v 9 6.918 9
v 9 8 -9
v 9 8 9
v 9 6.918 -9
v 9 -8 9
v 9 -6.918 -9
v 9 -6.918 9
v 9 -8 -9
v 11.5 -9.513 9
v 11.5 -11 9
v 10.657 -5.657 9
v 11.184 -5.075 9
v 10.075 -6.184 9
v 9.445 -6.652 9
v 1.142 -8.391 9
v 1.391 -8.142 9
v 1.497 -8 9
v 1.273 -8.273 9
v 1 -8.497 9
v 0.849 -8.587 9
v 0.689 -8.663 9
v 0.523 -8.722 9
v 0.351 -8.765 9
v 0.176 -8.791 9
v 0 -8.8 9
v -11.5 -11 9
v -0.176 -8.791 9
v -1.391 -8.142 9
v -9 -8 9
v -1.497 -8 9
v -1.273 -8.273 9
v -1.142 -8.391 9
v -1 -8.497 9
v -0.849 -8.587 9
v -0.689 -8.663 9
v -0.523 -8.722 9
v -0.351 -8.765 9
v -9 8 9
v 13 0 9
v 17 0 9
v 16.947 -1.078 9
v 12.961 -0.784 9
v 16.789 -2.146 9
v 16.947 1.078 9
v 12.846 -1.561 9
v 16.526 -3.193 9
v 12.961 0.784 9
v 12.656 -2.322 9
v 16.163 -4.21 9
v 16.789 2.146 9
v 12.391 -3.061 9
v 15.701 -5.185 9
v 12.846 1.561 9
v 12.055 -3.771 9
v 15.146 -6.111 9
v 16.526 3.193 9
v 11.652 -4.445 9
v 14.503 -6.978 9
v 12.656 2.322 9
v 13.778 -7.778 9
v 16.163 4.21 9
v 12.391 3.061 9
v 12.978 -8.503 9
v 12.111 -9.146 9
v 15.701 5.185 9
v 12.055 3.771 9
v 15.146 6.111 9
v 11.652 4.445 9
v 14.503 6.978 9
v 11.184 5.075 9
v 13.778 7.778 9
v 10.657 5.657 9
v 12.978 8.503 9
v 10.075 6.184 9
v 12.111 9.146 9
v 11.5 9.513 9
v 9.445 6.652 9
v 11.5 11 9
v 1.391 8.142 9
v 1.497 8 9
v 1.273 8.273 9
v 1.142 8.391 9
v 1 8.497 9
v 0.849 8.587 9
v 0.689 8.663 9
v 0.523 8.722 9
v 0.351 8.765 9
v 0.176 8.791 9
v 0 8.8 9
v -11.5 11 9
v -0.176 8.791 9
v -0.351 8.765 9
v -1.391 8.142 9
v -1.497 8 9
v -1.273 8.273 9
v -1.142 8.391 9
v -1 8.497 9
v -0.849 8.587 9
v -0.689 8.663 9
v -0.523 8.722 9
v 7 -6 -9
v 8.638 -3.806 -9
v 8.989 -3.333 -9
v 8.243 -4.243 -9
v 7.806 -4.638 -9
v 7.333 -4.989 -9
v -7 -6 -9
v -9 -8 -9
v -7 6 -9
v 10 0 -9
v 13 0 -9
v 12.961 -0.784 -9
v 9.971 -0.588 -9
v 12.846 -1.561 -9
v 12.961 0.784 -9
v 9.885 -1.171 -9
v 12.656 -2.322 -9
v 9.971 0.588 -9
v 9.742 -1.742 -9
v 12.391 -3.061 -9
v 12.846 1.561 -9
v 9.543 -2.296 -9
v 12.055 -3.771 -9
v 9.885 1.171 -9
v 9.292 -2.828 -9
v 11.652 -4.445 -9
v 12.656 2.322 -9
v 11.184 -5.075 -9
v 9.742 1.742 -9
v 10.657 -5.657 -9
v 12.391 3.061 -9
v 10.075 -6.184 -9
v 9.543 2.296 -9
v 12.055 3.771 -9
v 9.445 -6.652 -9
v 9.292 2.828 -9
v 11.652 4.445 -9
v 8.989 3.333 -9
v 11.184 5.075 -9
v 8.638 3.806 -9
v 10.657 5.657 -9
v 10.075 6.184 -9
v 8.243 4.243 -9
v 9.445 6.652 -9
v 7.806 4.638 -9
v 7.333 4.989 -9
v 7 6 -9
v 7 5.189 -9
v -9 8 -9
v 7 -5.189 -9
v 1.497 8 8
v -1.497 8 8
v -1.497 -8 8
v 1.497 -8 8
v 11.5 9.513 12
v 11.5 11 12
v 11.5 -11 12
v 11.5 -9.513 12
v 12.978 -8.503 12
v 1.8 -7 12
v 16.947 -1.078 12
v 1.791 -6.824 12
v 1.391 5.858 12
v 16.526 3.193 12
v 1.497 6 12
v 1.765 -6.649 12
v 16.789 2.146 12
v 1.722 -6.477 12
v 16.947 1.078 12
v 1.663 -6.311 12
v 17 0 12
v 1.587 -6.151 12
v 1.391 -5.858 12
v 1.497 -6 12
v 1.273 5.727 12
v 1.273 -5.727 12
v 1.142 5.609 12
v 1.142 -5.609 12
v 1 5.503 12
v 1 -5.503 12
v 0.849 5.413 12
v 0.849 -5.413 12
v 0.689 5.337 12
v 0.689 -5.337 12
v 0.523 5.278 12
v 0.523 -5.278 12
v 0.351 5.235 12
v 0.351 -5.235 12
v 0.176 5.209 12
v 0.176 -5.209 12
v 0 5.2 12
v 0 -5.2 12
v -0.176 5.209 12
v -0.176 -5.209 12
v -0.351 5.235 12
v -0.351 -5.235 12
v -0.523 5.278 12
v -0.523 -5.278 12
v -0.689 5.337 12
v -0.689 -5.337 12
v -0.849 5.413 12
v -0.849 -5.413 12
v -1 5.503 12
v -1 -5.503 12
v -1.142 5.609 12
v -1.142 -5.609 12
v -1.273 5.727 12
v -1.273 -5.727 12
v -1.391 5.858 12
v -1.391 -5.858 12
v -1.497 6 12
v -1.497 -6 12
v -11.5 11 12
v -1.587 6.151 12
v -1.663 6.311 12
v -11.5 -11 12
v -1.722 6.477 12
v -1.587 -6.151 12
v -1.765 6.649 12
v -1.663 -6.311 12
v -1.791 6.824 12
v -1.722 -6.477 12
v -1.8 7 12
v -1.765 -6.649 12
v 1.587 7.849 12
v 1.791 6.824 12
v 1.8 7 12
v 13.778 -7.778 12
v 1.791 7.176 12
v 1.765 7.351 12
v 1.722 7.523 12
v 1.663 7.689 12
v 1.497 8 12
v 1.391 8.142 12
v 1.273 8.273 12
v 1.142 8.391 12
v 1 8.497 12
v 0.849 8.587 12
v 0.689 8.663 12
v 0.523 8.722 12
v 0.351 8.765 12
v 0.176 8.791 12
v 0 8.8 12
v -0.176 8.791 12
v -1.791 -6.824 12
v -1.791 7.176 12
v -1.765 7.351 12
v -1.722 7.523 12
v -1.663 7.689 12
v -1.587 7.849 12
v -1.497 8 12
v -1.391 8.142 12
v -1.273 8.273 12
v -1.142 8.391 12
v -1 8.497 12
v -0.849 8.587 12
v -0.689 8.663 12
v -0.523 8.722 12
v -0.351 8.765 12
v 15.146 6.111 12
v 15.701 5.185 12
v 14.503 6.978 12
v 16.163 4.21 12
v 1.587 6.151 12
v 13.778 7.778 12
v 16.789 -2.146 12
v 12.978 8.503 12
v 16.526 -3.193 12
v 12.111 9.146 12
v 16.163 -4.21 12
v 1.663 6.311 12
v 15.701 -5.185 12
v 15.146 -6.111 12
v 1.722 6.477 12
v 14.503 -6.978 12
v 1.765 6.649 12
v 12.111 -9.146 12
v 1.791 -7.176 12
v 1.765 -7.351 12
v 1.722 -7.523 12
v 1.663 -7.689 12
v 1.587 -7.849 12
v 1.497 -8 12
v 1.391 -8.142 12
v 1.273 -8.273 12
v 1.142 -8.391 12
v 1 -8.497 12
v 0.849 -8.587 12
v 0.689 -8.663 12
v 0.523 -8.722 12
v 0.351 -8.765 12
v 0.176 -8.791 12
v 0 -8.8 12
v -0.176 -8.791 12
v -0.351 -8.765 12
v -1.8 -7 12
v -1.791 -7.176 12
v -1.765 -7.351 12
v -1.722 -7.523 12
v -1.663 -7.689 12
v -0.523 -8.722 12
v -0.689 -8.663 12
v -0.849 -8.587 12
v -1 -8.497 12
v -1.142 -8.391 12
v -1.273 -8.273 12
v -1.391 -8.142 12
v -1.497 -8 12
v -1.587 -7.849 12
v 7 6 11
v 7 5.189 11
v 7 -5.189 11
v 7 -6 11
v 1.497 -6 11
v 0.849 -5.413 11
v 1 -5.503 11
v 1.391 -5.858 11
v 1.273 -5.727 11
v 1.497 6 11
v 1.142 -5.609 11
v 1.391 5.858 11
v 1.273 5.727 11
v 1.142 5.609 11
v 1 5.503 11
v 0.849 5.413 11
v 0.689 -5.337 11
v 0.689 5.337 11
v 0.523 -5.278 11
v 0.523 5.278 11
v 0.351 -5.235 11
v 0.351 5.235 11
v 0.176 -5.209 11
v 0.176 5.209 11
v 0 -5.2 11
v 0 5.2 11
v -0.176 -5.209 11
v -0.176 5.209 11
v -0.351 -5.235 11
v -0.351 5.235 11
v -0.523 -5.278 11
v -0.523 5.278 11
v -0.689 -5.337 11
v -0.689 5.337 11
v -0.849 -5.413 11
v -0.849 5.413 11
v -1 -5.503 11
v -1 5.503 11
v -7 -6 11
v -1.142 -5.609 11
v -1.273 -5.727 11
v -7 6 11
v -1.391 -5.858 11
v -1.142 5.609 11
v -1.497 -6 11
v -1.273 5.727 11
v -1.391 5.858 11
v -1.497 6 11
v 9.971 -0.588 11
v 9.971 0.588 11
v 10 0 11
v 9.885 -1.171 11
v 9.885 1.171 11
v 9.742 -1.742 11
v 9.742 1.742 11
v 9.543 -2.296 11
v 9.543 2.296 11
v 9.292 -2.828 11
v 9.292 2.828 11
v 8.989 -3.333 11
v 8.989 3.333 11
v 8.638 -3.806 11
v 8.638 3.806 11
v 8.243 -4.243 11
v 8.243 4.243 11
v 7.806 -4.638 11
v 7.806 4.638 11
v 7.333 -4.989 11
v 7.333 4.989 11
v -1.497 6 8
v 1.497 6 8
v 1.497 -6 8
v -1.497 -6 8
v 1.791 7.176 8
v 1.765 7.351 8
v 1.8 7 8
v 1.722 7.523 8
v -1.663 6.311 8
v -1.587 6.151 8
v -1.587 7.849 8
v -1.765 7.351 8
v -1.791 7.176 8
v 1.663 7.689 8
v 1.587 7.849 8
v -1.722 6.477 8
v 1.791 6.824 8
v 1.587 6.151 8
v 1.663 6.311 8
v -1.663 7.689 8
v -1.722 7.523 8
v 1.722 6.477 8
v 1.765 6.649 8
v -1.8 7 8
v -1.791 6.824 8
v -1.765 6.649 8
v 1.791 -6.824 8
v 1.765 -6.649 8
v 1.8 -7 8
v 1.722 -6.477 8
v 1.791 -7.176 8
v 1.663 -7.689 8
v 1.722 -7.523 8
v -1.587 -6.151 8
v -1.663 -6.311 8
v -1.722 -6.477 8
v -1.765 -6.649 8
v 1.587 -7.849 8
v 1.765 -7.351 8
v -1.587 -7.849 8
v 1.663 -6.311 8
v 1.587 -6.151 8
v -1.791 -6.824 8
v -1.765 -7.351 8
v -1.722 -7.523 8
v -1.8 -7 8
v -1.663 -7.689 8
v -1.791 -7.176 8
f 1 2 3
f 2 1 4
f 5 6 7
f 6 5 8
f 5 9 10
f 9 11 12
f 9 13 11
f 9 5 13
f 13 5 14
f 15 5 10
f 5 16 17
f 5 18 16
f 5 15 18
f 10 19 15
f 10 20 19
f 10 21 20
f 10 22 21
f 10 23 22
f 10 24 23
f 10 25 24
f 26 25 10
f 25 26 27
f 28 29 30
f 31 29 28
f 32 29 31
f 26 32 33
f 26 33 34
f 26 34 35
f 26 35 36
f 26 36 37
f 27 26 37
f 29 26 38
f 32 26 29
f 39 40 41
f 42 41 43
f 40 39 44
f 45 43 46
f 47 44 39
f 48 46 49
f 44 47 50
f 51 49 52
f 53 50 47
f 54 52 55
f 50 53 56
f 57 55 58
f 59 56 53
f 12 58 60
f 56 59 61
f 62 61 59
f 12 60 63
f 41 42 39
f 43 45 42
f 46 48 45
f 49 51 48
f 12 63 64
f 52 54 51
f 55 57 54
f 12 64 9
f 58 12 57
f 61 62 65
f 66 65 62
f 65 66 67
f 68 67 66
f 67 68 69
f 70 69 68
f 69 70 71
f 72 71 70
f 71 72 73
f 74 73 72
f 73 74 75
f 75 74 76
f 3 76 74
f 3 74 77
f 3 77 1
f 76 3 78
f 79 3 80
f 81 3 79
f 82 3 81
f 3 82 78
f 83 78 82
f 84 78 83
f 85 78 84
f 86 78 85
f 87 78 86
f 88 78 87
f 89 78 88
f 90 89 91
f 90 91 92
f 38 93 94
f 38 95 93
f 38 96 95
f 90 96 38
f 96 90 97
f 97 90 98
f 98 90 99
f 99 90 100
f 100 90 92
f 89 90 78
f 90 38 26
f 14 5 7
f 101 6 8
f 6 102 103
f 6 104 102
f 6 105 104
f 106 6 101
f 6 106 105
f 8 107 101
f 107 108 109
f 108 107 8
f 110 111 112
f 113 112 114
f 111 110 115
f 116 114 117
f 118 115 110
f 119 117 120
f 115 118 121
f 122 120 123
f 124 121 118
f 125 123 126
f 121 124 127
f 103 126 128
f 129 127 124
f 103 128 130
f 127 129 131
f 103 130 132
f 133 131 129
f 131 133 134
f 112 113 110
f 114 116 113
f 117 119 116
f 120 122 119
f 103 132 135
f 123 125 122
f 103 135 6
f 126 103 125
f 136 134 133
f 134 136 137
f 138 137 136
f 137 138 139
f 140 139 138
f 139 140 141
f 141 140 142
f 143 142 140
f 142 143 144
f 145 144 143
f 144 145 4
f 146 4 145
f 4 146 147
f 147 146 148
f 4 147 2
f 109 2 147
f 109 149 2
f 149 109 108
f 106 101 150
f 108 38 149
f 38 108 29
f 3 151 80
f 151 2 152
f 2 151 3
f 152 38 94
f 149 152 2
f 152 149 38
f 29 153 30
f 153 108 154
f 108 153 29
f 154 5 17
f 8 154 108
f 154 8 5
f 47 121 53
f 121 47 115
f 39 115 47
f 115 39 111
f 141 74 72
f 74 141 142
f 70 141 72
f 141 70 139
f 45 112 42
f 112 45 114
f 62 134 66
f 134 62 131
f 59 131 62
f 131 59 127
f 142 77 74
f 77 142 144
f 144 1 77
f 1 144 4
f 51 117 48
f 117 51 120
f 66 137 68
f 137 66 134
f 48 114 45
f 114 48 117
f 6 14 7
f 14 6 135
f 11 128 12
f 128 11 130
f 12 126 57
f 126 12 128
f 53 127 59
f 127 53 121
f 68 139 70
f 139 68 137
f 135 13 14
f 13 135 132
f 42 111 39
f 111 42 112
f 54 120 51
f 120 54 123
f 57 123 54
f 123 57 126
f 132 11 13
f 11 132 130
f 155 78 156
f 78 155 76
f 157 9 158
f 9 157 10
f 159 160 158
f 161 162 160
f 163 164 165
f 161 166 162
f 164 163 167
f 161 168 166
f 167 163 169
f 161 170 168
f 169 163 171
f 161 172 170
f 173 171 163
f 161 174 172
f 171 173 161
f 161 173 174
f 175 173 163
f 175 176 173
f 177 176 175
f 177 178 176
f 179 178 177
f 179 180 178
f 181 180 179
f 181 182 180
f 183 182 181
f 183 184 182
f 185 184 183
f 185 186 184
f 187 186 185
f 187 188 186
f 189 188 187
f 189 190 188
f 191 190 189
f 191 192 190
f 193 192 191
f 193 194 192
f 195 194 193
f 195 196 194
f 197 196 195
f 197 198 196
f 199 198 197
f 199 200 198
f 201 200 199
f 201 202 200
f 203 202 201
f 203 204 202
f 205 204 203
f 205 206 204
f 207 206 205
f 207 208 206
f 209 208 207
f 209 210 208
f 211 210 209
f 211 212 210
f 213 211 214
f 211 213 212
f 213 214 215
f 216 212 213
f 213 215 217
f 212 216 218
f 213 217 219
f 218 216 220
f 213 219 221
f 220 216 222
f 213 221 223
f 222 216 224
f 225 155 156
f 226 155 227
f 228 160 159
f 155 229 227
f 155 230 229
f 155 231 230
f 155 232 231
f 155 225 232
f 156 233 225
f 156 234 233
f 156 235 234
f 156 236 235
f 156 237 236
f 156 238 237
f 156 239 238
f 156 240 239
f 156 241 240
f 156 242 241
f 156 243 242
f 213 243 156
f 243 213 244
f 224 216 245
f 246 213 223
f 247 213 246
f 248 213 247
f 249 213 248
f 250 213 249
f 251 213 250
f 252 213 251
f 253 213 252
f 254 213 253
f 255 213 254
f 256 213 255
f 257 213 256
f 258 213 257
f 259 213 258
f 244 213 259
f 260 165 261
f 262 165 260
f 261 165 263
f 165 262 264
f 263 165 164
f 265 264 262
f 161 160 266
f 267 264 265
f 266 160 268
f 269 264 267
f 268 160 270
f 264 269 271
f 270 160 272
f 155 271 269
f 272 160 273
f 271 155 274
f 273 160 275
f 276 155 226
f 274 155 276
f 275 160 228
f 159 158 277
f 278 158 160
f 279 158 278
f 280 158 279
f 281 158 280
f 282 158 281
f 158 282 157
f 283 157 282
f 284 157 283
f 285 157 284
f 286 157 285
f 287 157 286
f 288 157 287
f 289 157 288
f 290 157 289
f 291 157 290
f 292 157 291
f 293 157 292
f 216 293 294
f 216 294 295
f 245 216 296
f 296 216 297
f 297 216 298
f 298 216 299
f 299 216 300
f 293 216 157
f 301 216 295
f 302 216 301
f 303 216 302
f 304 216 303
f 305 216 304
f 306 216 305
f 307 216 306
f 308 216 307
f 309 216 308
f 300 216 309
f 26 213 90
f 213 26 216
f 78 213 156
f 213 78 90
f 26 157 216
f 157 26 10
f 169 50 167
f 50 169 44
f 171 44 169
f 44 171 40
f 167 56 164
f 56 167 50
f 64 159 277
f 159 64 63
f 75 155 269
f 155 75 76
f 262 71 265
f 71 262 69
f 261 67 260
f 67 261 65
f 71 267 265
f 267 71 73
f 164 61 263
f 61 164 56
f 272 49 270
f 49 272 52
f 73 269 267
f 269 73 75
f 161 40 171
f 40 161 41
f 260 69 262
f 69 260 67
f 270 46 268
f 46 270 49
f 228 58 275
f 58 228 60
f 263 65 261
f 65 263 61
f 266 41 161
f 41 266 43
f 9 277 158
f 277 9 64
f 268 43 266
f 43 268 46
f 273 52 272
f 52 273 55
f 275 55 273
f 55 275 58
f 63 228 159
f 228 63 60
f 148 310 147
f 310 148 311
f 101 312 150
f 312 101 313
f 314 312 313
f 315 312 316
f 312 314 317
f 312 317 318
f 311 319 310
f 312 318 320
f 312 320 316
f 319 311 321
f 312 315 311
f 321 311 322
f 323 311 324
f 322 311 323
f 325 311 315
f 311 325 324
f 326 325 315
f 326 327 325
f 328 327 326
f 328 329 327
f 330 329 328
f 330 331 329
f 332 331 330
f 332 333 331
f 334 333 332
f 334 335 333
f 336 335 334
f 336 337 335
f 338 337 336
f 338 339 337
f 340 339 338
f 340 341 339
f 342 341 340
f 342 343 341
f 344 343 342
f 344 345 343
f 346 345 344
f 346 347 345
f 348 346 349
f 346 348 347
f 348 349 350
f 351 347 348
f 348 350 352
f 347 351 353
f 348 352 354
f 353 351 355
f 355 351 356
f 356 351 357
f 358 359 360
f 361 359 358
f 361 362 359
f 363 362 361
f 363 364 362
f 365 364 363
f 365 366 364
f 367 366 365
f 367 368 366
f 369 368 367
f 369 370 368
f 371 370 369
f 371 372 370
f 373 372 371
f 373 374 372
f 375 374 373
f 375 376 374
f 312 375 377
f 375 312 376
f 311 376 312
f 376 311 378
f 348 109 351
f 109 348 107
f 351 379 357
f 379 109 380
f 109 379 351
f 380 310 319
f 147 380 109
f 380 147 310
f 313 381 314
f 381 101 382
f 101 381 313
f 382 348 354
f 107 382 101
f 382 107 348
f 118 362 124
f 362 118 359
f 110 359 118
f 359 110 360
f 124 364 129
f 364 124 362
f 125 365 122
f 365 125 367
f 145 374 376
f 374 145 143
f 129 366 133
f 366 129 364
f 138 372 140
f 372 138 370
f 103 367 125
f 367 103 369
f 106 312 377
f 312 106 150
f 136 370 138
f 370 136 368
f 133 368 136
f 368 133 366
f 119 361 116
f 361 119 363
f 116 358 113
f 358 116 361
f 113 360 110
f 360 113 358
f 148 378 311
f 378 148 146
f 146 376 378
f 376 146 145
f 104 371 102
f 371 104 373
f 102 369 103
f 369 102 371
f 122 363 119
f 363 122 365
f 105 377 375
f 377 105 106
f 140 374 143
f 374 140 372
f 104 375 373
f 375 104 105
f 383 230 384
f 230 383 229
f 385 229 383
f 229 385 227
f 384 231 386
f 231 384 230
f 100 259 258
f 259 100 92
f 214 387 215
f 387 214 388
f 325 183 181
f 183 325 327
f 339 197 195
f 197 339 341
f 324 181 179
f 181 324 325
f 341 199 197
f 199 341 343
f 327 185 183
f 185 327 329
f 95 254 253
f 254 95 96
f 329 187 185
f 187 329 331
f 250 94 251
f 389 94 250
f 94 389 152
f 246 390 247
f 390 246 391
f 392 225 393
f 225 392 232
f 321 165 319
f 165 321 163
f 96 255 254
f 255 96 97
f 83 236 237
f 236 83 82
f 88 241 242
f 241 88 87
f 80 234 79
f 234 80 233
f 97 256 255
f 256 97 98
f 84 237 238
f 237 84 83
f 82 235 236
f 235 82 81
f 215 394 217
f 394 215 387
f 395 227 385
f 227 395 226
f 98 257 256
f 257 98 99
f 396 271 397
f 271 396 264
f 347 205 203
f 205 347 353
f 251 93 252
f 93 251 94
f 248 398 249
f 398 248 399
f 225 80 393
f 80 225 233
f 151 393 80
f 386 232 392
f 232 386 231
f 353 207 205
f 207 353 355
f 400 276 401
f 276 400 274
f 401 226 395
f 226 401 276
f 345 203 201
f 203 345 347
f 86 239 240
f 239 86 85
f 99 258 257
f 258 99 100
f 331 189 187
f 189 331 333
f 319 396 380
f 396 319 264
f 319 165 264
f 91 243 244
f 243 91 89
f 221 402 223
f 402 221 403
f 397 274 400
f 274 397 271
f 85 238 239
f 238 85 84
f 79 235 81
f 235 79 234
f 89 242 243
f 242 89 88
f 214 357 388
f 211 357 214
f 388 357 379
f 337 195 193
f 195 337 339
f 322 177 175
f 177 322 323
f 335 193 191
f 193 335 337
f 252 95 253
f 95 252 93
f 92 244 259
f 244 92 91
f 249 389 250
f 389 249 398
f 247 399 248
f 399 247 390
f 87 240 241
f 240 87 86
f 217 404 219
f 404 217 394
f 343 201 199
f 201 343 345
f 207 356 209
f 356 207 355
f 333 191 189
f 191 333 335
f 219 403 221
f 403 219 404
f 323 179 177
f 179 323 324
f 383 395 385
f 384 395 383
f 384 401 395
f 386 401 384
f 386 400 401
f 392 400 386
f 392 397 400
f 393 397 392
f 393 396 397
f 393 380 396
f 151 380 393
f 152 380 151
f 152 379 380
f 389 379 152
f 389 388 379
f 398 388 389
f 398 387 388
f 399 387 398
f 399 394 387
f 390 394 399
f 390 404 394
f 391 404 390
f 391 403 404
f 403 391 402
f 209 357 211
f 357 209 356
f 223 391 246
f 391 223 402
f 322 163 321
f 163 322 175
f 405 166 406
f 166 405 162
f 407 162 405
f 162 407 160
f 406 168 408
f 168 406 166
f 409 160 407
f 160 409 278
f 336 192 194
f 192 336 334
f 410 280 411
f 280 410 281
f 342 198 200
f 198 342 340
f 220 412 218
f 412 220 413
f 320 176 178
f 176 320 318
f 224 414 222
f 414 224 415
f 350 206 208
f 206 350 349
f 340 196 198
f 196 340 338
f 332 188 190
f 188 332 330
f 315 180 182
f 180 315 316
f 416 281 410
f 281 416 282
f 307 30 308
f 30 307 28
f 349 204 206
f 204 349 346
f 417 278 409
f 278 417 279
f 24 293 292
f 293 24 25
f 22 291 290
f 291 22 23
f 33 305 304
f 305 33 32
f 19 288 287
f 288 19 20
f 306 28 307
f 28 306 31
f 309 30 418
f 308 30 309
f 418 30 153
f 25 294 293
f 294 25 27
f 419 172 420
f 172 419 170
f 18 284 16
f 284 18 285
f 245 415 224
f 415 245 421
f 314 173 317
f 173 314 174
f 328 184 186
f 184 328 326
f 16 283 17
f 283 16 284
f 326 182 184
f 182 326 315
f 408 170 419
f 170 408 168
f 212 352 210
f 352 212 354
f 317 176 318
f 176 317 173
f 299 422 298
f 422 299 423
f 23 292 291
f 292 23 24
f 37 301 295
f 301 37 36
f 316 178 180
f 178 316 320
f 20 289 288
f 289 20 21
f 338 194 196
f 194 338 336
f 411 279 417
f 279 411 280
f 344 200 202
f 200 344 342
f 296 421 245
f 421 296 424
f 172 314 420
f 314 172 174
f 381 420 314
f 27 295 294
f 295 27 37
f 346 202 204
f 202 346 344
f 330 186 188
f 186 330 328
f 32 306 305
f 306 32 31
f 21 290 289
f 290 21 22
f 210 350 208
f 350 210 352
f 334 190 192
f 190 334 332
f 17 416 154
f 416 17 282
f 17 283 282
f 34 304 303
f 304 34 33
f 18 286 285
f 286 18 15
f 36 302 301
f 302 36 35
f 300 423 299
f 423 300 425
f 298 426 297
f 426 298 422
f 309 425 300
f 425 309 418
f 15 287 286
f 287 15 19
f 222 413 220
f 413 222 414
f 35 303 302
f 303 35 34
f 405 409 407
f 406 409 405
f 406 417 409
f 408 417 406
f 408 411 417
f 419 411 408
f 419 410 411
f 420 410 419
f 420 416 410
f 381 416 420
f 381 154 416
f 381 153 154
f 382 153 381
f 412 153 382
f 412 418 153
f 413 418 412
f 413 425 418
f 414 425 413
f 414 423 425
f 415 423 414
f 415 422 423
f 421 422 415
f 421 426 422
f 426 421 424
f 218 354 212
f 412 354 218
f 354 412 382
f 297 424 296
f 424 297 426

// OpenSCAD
$fn=64;

module d_profile(width=20, height=12, depth=10){
    r = height/2;
    union(){
        translate([0,0,0]) cube([width - r, height, depth], center=true);
        translate([(width/2 - r),0,0]) cylinder(h=depth, r=r, center=true);
    }
}

module d_hole(width=16, height=8, depth=20){
    r = height/2;
    union(){
        cube([width - r, height, depth], center=true);
        translate([(width/2 - r),0,0]) cylinder(h=depth, r=r, center=true);
    }
}

module d_connector(body_w=26, body_h=16, body_d=18, bore_w=20, bore_h=12, bore_d=22, flange_t=3, flange_w=34, flange_h=22, screw_r=1.8, screw_offset_y=7){
    difference(){
        union(){
            d_profile(width=body_w, height=body_h, depth=body_d);
            translate([0,0,(body_d/2 + flange_t/2)]) d_profile(width=flange_w, height=flange_h, depth=flange_t);
        }
        d_hole(width=bore_w, height=bore_h, depth=bore_d);
        translate([0, screw_offset_y, (body_d/2 + flange_t/2)]) cylinder(h=flange_t+2, r=screw_r, center=true);
        translate([0,-screw_offset_y, (body_d/2 + flange_t/2)]) cylinder(h=flange_t+2, r=screw_r, center=true);
    }
}

d_connector();
